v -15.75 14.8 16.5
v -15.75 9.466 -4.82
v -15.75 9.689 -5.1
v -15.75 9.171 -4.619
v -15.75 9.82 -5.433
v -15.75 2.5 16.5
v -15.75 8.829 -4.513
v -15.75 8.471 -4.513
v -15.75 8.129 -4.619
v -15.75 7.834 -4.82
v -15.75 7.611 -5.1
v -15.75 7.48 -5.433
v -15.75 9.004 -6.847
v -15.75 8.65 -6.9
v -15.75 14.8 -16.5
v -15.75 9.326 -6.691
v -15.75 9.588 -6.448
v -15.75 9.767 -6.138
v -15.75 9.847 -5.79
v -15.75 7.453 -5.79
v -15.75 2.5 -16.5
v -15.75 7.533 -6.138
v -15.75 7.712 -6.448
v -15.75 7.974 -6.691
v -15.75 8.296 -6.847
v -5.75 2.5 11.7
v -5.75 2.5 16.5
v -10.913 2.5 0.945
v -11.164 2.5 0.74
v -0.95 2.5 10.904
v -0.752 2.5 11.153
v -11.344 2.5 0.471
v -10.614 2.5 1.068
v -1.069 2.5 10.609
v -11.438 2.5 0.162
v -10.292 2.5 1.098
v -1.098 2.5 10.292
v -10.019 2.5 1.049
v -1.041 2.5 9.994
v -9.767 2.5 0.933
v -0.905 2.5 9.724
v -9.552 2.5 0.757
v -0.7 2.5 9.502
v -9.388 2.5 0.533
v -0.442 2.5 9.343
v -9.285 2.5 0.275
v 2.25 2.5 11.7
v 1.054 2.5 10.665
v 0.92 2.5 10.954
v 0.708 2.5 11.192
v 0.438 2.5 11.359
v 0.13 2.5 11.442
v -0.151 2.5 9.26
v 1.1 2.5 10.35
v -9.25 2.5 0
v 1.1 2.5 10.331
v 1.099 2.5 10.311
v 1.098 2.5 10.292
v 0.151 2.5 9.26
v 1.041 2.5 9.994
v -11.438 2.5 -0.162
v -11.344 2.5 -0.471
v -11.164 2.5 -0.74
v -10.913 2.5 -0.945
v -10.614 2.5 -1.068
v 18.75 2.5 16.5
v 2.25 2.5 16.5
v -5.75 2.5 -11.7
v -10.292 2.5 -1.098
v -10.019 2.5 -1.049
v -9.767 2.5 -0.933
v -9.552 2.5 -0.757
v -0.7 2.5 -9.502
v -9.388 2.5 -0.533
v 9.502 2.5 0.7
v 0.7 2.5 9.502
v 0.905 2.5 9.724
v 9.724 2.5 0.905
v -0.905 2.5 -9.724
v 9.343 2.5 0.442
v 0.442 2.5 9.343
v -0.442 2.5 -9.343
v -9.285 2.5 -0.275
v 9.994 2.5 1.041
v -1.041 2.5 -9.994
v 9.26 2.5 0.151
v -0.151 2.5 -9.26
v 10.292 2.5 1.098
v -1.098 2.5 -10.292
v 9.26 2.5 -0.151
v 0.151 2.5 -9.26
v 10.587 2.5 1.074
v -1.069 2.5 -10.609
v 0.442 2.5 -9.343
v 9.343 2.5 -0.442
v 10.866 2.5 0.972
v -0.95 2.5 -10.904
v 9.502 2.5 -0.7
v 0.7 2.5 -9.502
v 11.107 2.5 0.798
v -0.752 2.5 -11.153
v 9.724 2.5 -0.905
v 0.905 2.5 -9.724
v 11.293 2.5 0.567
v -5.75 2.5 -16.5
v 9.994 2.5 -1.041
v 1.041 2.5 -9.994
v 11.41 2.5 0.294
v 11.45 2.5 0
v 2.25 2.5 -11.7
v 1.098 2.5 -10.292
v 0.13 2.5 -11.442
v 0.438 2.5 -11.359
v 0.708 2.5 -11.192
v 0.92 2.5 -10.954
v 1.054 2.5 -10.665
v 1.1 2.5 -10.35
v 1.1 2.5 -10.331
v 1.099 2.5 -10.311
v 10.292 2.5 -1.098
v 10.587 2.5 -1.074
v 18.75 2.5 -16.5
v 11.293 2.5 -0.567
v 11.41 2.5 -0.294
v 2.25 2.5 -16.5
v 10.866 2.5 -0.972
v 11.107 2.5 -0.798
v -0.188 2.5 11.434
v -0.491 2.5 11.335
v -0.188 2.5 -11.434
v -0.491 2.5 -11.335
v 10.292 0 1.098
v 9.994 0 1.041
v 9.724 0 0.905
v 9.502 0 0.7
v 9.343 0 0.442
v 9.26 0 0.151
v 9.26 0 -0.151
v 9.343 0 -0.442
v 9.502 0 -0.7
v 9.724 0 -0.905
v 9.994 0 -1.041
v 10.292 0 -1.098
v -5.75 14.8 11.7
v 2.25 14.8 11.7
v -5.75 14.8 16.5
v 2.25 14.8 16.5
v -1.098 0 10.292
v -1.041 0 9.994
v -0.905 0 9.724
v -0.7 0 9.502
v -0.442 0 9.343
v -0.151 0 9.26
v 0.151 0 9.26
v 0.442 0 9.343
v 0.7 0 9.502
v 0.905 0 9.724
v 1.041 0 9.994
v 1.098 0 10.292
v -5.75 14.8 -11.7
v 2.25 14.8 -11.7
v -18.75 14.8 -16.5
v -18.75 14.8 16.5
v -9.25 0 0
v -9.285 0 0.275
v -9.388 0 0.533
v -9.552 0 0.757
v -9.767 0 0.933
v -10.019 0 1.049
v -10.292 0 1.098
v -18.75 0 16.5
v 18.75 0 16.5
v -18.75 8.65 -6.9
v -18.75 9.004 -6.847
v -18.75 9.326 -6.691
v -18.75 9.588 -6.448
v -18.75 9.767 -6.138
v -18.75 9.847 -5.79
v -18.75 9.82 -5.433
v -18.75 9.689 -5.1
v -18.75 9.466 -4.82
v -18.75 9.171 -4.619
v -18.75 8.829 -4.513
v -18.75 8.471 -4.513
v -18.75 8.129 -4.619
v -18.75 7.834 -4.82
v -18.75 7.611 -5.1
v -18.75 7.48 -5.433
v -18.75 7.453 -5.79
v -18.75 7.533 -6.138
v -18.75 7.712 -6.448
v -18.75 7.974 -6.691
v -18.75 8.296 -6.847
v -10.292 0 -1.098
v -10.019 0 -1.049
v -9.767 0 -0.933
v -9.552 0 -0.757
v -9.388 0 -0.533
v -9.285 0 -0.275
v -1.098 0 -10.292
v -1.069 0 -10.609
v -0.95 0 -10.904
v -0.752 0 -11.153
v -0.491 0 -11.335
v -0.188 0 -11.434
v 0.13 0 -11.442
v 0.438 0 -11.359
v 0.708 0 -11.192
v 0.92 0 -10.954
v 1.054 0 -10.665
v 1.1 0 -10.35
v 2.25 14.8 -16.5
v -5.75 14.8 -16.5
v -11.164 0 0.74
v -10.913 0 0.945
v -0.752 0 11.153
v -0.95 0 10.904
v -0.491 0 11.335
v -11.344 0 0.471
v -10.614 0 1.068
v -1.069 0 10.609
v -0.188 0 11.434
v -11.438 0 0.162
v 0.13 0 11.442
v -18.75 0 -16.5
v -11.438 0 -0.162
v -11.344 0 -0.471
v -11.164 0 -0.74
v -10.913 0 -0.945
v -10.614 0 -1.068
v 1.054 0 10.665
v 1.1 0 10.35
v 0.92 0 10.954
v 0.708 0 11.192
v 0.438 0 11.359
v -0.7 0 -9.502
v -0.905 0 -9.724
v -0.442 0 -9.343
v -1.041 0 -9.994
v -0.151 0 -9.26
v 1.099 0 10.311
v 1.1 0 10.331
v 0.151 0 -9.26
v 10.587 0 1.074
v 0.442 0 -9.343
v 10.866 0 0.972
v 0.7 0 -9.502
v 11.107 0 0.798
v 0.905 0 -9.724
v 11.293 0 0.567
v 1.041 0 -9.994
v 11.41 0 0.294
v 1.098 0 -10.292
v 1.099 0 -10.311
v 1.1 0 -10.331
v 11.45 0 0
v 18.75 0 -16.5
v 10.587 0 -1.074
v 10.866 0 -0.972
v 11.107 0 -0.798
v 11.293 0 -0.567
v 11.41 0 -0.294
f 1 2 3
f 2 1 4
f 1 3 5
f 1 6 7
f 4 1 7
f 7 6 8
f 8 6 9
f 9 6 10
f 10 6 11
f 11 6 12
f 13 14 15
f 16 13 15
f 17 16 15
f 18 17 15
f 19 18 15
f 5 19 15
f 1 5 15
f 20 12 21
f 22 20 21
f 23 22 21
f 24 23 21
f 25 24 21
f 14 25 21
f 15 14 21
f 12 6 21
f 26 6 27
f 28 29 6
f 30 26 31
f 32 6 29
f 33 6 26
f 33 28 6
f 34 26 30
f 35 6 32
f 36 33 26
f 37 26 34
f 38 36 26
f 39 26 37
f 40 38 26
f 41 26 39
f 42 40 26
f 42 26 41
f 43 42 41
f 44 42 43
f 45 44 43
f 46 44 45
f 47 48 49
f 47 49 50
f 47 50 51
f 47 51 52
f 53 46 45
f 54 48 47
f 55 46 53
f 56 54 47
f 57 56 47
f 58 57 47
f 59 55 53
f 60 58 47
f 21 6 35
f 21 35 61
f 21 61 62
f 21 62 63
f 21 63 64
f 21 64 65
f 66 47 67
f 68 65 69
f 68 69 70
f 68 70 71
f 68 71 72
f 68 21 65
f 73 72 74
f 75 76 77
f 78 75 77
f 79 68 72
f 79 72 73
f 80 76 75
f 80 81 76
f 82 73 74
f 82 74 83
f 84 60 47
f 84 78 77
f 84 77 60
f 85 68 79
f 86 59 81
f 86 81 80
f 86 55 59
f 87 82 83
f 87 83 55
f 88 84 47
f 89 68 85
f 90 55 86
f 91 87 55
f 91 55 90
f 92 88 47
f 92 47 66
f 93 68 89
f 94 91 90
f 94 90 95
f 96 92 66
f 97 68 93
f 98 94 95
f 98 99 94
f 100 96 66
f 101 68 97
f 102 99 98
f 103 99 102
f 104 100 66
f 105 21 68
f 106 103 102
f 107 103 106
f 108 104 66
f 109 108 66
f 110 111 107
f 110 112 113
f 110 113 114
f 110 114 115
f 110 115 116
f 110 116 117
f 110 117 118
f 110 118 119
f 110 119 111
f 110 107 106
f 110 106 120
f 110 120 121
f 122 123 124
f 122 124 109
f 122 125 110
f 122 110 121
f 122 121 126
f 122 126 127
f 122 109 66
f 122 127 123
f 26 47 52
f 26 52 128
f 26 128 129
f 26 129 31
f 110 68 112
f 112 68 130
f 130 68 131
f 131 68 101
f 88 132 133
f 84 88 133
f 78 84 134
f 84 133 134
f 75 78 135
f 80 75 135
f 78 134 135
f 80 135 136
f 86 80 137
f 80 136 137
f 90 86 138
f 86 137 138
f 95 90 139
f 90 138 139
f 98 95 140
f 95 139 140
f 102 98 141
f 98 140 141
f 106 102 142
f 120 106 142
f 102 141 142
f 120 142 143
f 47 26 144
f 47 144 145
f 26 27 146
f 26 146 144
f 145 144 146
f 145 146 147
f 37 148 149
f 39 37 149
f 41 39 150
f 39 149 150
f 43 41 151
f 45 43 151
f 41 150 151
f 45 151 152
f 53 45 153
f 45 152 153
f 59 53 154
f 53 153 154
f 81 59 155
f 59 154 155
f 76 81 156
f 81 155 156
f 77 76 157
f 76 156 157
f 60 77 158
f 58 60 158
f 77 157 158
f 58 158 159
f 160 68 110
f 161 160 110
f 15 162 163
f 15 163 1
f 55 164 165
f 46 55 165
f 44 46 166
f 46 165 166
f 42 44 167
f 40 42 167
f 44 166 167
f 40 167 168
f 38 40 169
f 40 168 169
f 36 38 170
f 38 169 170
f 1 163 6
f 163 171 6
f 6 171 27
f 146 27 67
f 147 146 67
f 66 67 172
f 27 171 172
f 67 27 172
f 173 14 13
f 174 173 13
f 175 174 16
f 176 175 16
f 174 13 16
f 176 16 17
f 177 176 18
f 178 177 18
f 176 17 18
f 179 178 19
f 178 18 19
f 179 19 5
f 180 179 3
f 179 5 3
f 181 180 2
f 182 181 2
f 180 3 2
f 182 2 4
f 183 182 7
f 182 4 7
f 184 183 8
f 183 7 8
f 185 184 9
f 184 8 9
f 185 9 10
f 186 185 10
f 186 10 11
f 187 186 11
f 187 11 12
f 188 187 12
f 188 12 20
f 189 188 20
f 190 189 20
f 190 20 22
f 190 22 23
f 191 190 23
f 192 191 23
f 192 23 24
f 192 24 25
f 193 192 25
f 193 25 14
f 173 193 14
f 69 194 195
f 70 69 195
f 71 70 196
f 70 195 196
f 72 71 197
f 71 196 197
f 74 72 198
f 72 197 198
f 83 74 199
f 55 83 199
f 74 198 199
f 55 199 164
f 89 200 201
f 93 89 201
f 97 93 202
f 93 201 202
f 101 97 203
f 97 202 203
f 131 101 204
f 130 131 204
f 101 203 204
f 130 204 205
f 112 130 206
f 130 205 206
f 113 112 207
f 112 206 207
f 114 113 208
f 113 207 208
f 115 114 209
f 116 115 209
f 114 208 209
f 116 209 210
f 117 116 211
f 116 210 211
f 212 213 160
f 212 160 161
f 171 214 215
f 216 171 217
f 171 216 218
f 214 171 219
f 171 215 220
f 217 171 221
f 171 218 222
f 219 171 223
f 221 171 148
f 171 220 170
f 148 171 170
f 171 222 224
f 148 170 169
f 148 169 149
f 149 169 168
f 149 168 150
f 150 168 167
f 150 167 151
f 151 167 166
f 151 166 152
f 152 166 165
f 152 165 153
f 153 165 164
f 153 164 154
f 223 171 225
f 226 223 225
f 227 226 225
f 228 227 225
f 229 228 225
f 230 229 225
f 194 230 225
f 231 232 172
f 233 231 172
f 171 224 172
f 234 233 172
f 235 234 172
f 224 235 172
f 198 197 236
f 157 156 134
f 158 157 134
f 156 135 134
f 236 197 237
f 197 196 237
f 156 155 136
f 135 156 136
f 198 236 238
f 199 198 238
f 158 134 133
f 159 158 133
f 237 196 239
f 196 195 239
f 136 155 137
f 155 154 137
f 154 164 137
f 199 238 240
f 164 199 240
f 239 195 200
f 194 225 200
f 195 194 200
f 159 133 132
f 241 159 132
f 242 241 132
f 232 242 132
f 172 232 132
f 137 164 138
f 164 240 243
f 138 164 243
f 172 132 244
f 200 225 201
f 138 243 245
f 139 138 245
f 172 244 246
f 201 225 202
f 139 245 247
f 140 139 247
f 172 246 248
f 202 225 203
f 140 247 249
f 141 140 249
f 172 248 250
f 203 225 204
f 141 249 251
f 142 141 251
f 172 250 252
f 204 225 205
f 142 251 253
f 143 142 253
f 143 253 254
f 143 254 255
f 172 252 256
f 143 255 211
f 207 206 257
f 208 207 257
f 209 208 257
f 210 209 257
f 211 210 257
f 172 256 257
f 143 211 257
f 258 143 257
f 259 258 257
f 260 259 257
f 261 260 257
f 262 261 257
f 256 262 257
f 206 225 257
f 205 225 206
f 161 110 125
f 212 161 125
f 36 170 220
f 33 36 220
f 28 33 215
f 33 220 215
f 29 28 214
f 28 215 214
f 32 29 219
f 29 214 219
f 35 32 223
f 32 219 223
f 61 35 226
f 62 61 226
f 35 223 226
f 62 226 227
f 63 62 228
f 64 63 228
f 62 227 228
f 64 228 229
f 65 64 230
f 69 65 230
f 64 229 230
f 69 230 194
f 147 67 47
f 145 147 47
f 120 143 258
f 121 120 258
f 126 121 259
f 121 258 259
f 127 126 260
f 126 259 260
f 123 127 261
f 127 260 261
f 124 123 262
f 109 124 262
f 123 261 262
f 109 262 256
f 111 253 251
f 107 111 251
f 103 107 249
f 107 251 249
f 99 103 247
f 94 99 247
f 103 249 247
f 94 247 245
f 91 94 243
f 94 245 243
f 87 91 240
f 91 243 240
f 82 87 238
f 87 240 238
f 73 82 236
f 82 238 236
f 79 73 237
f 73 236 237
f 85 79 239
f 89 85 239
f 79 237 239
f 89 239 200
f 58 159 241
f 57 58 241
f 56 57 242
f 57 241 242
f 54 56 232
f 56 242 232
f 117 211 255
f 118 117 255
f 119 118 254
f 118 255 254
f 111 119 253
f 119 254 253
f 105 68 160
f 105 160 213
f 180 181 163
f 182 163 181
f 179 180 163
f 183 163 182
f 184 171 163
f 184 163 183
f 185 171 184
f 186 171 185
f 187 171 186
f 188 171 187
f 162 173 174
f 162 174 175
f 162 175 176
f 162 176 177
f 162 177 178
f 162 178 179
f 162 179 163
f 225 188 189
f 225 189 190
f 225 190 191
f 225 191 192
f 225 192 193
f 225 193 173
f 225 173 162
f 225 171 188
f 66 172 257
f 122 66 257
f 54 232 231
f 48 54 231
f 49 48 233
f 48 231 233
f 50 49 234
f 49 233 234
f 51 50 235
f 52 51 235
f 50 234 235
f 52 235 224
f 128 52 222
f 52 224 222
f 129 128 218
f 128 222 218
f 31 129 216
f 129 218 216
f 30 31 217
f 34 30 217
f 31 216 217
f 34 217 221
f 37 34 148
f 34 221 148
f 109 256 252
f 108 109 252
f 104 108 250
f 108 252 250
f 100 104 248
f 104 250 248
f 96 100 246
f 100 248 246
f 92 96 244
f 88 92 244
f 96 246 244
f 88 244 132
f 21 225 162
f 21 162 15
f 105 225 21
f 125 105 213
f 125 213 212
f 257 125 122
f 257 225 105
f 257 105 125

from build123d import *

# Parameters (mm, degrees)
SKIZZE1_W                       = 37.5
SKIZZE1_H                       = 33
AUFSATZ_LINEAR_AUSTRAGEN1_DEPTH = 2.5
SKIZZE2_W                       = 3
SKIZZE2_H                       = 33
SKIZZE2_W_2                     = 8
SKIZZE2_H_2                     = 4.8
AUFSATZ_LINEAR_AUSTRAGEN2_DEPTH = 12.3
SCHNITT_LINEAR_AUSTRAGEN3_DEPTH = 30.031922086
SKIZZE5_R                       = 1.2
SCHNITT_LINEAR_AUSTRAGEN4_DEPTH = 42.006584837


with BuildPart() as part:
    # Skizze1 → Aufsatz-Linear austragen1 (new body)
    with BuildSketch(Plane(origin=(0, 0, 0), x_dir=(1, 0, 0), z_dir=(0, 1, 0))):
        Rectangle(SKIZZE1_W, SKIZZE1_H)
    extrude(amount=AUFSATZ_LINEAR_AUSTRAGEN1_DEPTH)

    # Skizze2 → Aufsatz-Linear austragen2 (add)
    with BuildSketch(Plane(origin=(0, 2.5, 0), x_dir=(1, 0, 0), z_dir=(0, 1, 0))):
        with Locations((-17.25, 0)):
            Rectangle(SKIZZE2_W, SKIZZE2_H)
        with Locations((-1.75, -14.1)):
            Rectangle(SKIZZE2_W_2, SKIZZE2_H_2)
        with Locations((-1.75, 14.1)):
            Rectangle(SKIZZE2_W_2, SKIZZE2_H_2)
    extrude(amount=AUFSATZ_LINEAR_AUSTRAGEN2_DEPTH)

    # Skizze6 → Schnitt-Linear austragen3 (cut, through all)
    with BuildSketch(Plane.XZ):
        with BuildLine():
            ThreePointArc((-10.291545894, -1.098445774), (-9.551783389, -0.756868708), (-9.25, 0))
            ThreePointArc((-9.25, 0), (-9.551783389, 0.756868708), (-10.291545894, 1.098445774))
            ThreePointArc((-10.291545894, 1.098445774), (-10.35, 0), (-10.291545894, -1.098445774))
        make_face()
        with BuildLine():
            ThreePointArc((-10.291545894, -1.098445774), (-10.35, 0), (-10.291545894, 1.098445774))
            ThreePointArc((-10.291545894, 1.098445774), (-11.45, 0), (-10.291545894, -1.098445774))
        make_face()
        with BuildLine():
            ThreePointArc((-1.098445774, 10.291545894), (0, 9.25), (1.098445774, 10.291545894))
            ThreePointArc((1.098445774, 10.291545894), (0, 10.35), (-1.098445774, 10.291545894))
        make_face()
        with BuildLine():
            ThreePointArc((-1.098445774, 10.291545894), (0, 10.35), (1.098445774, 10.291545894))
            ThreePointArc((1.098445774, 10.291545894), (1.099611375, 10.320762617), (1.1, 10.35))
            ThreePointArc((1.1, 10.35), (-0.029237383, 11.449611375), (-1.098445774, 10.291545894))
        make_face()
        with BuildLine():
            ThreePointArc((10.291545894, -1.098445774), (11.106868708, -0.798216611), (11.45, 0))
            ThreePointArc((11.45, 0), (11.106868708, 0.798216611), (10.291545894, 1.098445774))
            ThreePointArc((10.291545894, 1.098445774), (10.35, 0), (10.291545894, -1.098445774))
        make_face()
        with BuildLine():
            ThreePointArc((10.291545894, -1.098445774), (10.35, 0), (10.291545894, 1.098445774))
            ThreePointArc((10.291545894, 1.098445774), (9.25, 0), (10.291545894, -1.098445774))
        make_face()
        with BuildLine():
            ThreePointArc((-1.098445774, -10.291545894), (-0.029237383, -11.449611375), (1.1, -10.35))
            ThreePointArc((1.1, -10.35), (1.099611375, -10.320762617), (1.098445774, -10.291545894))
            ThreePointArc((1.098445774, -10.291545894), (0, -10.35), (-1.098445774, -10.291545894))
        make_face()
        with BuildLine():
            ThreePointArc((-1.098445774, -10.291545894), (0, -10.35), (1.098445774, -10.291545894))
            ThreePointArc((1.098445774, -10.291545894), (0, -9.25), (-1.098445774, -10.291545894))
        make_face()
    extrude(amount=-SCHNITT_LINEAR_AUSTRAGEN3_DEPTH, mode=Mode.SUBTRACT)

    # Skizze5 → Schnitt-Linear austragen4 (cut, through all)
    with BuildSketch(Plane(origin=(-15.75, 0, 0), x_dir=(0, 0, -1), z_dir=(1, 0, 0))):
        with Locations((5.7, 8.65)):
            Circle(SKIZZE5_R)
    extrude(amount=-SCHNITT_LINEAR_AUSTRAGEN4_DEPTH, mode=Mode.SUBTRACT)


solid = part.part
